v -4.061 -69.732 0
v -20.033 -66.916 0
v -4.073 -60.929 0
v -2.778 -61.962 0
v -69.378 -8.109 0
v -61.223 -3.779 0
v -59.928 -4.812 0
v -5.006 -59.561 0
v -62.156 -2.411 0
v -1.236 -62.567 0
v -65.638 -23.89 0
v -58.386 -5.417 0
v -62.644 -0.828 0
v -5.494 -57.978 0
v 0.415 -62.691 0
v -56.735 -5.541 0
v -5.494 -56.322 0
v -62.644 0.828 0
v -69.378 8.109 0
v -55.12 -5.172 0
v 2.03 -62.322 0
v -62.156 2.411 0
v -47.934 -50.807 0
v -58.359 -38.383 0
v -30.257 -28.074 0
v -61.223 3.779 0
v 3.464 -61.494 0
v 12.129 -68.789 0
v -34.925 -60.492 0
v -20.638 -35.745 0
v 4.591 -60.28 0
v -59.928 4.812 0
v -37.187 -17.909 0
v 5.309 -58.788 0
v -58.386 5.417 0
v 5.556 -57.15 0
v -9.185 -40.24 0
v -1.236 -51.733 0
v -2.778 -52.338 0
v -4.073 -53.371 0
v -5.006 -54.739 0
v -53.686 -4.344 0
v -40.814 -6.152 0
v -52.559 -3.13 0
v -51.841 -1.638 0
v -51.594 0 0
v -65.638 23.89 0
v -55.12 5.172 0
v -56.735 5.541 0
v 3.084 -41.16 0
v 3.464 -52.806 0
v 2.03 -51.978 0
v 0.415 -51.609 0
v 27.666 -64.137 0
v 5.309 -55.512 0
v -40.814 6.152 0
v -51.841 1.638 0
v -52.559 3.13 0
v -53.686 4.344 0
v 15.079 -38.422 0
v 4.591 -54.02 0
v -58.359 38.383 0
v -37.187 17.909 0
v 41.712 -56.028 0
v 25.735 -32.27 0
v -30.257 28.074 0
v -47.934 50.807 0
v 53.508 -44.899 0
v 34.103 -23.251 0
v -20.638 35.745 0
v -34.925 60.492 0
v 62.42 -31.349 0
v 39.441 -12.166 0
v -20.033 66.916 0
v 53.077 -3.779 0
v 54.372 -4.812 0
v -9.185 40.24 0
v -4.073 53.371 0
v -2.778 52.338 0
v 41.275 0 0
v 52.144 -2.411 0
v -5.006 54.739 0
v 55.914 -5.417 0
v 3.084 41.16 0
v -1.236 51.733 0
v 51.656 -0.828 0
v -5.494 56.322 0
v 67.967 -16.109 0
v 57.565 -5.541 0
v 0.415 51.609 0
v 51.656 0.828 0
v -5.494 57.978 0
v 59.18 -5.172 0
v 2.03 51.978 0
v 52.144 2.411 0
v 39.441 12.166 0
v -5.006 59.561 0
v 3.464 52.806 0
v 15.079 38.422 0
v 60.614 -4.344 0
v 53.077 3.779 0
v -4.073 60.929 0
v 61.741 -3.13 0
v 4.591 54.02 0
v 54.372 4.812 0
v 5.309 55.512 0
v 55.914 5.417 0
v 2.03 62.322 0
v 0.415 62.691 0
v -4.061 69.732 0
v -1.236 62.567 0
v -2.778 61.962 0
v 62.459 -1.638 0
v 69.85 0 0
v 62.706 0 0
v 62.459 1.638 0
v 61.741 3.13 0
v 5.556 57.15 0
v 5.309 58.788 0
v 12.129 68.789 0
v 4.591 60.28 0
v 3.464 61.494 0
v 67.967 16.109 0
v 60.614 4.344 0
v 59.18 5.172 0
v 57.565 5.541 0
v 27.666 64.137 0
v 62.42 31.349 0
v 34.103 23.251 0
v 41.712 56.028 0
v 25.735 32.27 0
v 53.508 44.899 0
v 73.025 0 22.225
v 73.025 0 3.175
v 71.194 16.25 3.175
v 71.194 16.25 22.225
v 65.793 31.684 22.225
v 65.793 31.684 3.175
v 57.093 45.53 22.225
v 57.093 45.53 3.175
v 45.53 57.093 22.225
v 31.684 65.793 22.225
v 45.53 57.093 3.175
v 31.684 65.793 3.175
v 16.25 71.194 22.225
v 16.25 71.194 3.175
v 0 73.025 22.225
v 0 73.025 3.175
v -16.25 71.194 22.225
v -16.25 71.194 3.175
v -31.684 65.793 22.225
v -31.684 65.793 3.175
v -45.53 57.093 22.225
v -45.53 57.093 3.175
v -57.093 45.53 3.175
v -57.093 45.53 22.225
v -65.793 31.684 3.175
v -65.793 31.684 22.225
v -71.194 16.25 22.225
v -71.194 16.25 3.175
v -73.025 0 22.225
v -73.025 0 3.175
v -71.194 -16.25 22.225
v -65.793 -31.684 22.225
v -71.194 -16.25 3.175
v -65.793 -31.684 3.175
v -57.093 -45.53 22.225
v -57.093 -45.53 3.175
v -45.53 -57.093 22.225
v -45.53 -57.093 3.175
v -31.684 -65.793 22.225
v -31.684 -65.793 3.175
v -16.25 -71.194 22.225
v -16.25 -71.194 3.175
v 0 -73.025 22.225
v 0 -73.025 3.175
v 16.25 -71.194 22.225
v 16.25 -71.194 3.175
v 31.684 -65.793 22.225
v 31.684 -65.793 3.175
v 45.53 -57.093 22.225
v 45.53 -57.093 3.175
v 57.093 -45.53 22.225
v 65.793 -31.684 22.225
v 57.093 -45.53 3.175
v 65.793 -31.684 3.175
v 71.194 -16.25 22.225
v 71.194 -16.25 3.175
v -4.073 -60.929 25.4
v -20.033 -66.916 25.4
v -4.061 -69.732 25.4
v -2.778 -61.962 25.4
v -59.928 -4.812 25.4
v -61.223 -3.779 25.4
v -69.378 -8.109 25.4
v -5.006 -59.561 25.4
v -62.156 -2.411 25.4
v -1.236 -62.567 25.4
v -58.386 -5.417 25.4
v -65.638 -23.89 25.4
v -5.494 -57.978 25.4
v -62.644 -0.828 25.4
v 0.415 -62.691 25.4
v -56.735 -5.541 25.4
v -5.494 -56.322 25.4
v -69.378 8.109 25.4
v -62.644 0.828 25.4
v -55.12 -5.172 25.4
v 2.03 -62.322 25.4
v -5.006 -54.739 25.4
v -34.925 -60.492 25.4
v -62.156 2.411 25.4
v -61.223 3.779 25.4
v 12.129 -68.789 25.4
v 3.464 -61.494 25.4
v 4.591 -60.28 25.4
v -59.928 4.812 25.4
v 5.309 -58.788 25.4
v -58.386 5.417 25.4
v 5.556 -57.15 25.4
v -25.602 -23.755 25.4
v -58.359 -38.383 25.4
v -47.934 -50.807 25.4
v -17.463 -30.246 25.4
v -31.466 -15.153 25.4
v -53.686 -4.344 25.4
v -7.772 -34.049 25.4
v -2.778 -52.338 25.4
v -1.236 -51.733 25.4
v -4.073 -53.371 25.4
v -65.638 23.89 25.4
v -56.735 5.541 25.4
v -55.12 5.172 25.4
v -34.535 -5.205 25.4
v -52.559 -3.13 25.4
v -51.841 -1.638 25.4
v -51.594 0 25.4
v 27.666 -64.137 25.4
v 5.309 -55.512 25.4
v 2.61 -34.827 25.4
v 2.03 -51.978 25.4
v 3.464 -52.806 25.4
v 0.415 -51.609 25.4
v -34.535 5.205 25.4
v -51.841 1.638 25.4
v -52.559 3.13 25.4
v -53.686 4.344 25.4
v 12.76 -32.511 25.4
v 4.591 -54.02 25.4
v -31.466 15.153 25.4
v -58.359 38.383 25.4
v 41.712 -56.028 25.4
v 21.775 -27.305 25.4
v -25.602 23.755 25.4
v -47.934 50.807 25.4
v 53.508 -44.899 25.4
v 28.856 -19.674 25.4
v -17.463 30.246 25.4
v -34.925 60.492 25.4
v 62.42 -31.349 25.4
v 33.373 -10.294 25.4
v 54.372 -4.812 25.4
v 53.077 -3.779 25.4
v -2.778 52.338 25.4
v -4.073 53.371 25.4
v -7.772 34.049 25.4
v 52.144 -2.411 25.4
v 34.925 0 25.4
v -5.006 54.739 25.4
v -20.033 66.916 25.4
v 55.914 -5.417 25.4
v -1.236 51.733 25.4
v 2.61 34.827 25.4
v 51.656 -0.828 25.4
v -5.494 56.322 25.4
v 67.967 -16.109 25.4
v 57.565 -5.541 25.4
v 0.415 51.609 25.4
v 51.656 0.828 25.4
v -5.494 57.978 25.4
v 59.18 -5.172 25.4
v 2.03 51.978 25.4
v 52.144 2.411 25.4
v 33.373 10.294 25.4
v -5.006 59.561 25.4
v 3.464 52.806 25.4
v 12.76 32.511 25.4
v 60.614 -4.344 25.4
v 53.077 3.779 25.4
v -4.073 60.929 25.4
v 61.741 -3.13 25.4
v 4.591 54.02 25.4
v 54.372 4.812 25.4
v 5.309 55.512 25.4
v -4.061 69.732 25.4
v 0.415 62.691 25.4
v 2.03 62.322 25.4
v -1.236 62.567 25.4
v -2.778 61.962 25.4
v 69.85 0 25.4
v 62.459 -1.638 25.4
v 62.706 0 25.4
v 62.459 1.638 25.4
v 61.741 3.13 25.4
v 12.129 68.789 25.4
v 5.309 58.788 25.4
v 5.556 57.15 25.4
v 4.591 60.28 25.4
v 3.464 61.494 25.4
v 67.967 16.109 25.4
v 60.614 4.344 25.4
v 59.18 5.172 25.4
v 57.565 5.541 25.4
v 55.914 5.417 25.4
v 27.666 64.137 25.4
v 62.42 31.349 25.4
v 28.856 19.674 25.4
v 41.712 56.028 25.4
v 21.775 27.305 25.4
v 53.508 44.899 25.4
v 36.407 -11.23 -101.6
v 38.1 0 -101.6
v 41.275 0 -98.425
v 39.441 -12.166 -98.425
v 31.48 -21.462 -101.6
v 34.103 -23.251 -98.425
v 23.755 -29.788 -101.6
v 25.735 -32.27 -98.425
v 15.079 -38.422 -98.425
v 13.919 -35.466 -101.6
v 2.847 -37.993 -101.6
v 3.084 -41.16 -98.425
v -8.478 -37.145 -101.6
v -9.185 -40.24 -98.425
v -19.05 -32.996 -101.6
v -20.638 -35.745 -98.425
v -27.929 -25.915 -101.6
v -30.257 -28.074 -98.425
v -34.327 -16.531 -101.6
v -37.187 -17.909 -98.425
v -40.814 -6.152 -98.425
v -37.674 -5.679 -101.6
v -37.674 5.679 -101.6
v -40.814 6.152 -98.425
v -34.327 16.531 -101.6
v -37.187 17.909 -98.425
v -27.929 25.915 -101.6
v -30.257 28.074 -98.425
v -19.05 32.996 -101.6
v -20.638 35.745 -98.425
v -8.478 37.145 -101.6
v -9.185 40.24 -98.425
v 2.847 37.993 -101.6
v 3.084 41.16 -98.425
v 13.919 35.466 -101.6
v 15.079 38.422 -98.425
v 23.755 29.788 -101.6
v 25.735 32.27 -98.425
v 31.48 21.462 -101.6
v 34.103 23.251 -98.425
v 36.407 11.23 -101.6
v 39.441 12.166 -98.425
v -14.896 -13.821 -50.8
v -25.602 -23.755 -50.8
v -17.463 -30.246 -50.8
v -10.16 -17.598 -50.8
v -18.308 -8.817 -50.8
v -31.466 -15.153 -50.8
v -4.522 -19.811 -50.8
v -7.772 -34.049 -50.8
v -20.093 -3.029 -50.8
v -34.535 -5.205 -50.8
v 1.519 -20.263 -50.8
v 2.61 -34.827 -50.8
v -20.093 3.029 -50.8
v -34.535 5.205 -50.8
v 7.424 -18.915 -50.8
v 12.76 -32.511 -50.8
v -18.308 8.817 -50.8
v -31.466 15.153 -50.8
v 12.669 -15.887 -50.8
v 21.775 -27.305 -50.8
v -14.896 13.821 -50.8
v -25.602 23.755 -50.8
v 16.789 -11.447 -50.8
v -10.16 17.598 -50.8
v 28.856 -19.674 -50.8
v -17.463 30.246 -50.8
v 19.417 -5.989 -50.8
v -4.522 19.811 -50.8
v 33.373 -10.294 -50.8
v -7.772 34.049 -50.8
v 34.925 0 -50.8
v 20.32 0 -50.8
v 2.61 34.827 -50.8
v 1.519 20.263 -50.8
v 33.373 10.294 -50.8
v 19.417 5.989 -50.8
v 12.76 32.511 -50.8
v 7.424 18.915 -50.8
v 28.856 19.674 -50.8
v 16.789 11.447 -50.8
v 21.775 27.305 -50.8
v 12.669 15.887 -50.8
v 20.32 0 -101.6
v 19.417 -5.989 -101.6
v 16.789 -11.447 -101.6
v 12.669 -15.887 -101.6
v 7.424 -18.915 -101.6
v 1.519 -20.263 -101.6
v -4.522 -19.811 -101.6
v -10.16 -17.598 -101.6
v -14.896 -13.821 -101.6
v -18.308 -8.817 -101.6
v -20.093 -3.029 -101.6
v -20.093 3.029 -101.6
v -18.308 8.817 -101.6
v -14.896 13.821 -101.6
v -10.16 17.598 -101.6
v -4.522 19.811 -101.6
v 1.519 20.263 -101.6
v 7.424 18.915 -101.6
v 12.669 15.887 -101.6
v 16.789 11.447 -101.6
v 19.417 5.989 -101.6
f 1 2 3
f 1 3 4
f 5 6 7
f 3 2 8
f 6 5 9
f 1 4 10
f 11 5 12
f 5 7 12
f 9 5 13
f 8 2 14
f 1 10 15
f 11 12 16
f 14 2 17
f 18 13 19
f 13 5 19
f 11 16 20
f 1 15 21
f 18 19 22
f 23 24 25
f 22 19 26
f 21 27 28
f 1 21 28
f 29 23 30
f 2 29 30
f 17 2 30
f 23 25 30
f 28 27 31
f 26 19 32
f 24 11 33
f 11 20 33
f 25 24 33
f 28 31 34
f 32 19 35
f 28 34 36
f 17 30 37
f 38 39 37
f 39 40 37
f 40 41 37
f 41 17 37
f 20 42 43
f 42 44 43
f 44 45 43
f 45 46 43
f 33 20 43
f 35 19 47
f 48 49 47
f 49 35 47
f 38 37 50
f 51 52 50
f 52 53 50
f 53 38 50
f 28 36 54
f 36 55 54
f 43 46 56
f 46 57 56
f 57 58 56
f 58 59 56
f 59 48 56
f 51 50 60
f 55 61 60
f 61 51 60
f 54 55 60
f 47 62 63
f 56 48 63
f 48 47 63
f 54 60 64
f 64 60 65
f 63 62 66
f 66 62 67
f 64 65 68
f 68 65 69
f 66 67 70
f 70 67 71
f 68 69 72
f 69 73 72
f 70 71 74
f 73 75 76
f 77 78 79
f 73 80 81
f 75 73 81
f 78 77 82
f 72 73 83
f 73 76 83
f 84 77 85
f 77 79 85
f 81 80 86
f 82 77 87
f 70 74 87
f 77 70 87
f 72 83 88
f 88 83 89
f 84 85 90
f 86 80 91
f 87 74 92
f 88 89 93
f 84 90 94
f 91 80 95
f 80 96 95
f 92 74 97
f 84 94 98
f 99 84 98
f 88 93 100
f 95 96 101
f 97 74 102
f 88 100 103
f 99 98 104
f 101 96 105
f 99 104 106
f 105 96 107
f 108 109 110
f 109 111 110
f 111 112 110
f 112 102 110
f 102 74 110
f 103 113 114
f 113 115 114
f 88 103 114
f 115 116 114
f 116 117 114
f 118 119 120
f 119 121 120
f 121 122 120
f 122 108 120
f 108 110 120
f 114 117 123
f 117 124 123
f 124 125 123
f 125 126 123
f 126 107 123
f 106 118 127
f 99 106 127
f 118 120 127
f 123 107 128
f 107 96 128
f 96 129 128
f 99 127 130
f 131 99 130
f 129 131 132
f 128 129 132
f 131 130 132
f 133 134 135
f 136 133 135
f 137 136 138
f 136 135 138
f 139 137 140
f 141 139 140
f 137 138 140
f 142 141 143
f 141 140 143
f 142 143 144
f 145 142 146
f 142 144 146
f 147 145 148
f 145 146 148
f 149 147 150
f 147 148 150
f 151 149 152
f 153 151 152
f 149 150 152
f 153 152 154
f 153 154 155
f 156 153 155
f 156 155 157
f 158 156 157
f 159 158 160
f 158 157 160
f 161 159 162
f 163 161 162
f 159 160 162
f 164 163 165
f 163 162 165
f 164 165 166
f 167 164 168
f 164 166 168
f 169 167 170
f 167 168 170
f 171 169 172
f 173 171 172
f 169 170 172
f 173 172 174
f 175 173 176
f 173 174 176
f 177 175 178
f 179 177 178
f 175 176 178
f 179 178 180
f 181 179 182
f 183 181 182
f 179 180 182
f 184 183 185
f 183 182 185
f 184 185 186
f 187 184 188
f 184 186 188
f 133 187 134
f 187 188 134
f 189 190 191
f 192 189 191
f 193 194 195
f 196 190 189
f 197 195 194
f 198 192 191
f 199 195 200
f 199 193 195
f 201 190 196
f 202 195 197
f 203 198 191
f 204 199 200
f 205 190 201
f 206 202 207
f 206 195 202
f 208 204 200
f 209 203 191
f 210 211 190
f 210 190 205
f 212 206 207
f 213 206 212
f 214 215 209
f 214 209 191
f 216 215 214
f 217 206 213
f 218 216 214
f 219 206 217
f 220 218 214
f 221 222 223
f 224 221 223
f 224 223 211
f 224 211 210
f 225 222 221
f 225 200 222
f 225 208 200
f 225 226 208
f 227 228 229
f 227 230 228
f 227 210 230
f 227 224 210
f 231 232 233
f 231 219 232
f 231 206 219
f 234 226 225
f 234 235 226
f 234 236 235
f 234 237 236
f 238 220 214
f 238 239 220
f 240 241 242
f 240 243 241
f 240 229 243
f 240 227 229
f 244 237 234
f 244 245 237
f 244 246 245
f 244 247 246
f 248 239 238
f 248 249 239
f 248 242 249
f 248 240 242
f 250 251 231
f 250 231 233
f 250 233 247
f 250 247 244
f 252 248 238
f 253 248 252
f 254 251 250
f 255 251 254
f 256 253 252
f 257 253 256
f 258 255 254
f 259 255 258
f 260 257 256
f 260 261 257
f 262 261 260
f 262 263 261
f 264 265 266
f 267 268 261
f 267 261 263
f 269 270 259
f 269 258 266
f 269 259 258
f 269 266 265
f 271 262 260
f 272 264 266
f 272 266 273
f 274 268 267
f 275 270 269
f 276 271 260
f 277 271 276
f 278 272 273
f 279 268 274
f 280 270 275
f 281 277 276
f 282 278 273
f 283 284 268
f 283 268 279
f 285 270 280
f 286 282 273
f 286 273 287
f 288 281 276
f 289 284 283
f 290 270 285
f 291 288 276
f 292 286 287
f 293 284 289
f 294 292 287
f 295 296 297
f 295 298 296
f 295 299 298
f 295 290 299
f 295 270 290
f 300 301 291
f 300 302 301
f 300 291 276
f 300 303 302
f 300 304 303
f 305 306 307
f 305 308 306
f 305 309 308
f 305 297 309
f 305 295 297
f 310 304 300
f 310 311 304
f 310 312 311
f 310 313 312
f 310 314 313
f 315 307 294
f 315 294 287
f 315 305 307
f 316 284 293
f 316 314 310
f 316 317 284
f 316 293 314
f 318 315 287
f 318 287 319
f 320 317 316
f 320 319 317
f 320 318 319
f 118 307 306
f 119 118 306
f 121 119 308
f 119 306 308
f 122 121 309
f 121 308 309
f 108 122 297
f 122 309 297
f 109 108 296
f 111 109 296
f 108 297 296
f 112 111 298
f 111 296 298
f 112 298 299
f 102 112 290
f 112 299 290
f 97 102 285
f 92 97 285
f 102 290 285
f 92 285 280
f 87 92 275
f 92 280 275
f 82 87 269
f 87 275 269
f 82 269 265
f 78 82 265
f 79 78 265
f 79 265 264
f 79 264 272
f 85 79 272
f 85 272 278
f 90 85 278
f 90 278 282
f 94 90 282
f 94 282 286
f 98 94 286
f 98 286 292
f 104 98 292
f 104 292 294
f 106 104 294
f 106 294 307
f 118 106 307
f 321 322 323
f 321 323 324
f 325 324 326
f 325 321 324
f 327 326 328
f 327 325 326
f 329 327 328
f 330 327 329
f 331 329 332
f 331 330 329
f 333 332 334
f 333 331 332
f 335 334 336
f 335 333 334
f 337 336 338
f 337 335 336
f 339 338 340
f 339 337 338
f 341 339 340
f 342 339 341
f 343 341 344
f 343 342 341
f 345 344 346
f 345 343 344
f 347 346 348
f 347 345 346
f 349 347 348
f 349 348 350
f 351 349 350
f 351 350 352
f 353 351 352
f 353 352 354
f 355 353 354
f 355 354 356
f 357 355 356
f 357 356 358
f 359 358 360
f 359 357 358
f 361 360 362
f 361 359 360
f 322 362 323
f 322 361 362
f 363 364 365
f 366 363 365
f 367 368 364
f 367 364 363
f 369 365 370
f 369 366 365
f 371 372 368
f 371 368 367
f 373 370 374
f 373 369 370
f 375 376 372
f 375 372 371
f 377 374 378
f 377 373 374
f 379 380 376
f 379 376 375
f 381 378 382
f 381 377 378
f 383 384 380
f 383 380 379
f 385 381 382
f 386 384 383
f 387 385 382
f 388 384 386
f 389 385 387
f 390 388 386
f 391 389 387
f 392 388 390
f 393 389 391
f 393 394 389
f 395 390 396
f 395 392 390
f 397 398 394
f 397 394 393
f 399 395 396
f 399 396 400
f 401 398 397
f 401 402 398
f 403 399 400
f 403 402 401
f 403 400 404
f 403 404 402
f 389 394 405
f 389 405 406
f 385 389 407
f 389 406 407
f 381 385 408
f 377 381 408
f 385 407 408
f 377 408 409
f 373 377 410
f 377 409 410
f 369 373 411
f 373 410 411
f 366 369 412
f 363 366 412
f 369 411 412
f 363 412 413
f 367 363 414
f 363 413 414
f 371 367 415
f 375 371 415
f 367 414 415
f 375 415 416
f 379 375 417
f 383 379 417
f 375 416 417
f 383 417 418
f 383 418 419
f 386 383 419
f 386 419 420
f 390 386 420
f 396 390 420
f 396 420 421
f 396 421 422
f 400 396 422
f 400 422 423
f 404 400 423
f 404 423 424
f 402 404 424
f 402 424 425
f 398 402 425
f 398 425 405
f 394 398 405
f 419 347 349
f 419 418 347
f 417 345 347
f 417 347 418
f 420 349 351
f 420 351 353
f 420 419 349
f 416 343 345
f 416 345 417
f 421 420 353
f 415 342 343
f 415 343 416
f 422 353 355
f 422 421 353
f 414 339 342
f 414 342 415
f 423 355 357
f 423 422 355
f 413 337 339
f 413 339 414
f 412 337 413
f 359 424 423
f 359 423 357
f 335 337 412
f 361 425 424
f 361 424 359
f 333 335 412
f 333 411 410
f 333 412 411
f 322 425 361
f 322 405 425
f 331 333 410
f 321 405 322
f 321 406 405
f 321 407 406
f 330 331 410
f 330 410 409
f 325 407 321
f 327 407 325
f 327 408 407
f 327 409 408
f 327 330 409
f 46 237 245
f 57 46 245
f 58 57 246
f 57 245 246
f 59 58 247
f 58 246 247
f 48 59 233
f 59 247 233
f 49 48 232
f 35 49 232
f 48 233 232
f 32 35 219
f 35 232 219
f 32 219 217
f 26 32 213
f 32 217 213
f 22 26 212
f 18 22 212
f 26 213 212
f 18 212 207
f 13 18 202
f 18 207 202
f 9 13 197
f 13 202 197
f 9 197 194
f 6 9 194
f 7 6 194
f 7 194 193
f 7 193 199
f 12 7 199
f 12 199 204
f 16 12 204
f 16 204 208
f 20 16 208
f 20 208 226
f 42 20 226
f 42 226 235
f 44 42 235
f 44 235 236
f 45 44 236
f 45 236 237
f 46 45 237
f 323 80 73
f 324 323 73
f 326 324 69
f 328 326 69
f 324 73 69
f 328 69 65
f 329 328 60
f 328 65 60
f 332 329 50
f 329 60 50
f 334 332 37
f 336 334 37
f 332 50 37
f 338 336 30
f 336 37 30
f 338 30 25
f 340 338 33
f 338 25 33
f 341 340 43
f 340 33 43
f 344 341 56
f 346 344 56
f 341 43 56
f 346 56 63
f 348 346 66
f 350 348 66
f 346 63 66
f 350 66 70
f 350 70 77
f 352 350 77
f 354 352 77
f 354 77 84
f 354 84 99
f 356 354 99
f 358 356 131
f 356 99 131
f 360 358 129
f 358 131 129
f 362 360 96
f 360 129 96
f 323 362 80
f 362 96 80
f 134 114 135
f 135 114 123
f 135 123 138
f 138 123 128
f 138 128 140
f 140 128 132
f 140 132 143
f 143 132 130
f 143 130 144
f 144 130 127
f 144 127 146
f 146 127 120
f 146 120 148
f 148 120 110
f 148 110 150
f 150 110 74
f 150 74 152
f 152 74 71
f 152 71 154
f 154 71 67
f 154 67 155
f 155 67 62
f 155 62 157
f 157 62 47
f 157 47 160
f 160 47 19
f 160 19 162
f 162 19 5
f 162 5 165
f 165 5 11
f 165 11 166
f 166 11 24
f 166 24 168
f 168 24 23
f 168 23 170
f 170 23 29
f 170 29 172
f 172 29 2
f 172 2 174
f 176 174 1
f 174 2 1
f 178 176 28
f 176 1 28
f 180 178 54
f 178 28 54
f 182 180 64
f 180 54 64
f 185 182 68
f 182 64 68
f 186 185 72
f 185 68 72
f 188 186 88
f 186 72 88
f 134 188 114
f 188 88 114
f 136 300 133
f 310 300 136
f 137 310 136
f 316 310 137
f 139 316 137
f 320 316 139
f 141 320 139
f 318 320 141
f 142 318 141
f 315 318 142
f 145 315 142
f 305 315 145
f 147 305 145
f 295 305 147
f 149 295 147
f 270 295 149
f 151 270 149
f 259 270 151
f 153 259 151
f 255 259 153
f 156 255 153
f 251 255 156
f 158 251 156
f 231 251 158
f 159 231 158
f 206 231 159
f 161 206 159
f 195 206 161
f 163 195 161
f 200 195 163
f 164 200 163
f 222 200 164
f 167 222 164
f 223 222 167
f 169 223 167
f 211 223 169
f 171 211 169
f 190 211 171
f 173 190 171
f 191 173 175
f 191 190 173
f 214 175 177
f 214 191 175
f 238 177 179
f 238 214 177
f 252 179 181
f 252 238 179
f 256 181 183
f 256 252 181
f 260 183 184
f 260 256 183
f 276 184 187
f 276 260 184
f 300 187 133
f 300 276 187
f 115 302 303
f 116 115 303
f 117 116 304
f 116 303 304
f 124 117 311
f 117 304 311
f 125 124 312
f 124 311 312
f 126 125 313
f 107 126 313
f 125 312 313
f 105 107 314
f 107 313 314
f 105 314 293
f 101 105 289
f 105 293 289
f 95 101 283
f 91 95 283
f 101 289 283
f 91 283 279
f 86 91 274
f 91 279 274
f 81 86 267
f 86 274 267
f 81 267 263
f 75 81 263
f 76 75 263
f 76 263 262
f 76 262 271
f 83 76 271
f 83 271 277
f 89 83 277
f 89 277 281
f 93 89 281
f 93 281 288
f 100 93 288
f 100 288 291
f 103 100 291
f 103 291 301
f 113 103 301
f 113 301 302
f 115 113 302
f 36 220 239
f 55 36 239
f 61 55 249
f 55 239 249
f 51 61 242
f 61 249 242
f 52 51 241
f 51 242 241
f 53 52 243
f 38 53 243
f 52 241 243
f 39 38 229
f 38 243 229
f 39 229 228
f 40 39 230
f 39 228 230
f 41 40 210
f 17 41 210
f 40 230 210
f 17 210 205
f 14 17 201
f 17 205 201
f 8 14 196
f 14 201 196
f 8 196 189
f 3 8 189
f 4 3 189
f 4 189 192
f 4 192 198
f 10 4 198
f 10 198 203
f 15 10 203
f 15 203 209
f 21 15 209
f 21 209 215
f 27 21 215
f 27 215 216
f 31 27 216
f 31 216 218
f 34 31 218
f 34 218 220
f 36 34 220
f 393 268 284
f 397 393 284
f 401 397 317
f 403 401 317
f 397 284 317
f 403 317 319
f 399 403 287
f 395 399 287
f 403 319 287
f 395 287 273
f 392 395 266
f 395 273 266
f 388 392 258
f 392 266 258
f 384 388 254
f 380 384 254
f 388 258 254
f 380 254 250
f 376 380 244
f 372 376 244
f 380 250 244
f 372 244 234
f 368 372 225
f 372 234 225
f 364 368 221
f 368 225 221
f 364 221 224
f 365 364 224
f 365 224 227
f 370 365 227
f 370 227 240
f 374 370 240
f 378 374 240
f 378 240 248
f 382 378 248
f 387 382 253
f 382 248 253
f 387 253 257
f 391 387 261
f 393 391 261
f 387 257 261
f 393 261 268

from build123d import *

# Parameters (mm, degrees)
F0_R     = 73.025
F1_DEPTH = 25.4
F2_R     = 41.275
F3_DEPTH = 101.6
F4_R     = 20.32
F5_DEPTH = 127.001
F6_R     = 5.55625
F6_R_2   = 34.925
F7_DEPTH = 76.2
F8_SIZE  = 3.175


with BuildPart() as f1:
    # F0 (on Top) → F1 (new body)
    with BuildSketch(Plane.XY):
        Circle(F0_R)
    extrude(amount=F1_DEPTH)

    # F2 (on face) → F3 (join)
    with BuildSketch(Plane(origin=(0, 0, 0), x_dir=(1, 0, 0), z_dir=(0, 0, -1))):
        Circle(F2_R)
    extrude(amount=F3_DEPTH)

    # F4 (on face) → F5 (cut, through all)
    with BuildSketch(Plane(origin=(0, 0, -101.6), x_dir=(1, 0, 0), z_dir=(0, 0, -1))):
        Circle(F4_R)
    extrude(amount=-F5_DEPTH, mode=Mode.SUBTRACT)

    # F6 (on face) → F7 (cut)
    with BuildSketch(Plane.XY.offset(25.4)):
        with Locations((-57.15, 0)):
            Circle(F6_R)
        with Locations((0, 57.15)):
            Circle(F6_R)
        with Locations((57.15, 0)):
            Circle(F6_R)
        with Locations((0, -57.15)):
            Circle(F6_R)
        Circle(F6_R_2)
    extrude(amount=-F7_DEPTH, mode=Mode.SUBTRACT)

    # F8
    f8_edges = [f1.edges().sort_by_distance(p)[0] for p in [
        (-73.025, 0, 25.4),
        (-73.025, 0, 0),
        (-41.275, 0, -101.6),
    ]]
    chamfer(f8_edges, length=F8_SIZE)


solid = f1.part
